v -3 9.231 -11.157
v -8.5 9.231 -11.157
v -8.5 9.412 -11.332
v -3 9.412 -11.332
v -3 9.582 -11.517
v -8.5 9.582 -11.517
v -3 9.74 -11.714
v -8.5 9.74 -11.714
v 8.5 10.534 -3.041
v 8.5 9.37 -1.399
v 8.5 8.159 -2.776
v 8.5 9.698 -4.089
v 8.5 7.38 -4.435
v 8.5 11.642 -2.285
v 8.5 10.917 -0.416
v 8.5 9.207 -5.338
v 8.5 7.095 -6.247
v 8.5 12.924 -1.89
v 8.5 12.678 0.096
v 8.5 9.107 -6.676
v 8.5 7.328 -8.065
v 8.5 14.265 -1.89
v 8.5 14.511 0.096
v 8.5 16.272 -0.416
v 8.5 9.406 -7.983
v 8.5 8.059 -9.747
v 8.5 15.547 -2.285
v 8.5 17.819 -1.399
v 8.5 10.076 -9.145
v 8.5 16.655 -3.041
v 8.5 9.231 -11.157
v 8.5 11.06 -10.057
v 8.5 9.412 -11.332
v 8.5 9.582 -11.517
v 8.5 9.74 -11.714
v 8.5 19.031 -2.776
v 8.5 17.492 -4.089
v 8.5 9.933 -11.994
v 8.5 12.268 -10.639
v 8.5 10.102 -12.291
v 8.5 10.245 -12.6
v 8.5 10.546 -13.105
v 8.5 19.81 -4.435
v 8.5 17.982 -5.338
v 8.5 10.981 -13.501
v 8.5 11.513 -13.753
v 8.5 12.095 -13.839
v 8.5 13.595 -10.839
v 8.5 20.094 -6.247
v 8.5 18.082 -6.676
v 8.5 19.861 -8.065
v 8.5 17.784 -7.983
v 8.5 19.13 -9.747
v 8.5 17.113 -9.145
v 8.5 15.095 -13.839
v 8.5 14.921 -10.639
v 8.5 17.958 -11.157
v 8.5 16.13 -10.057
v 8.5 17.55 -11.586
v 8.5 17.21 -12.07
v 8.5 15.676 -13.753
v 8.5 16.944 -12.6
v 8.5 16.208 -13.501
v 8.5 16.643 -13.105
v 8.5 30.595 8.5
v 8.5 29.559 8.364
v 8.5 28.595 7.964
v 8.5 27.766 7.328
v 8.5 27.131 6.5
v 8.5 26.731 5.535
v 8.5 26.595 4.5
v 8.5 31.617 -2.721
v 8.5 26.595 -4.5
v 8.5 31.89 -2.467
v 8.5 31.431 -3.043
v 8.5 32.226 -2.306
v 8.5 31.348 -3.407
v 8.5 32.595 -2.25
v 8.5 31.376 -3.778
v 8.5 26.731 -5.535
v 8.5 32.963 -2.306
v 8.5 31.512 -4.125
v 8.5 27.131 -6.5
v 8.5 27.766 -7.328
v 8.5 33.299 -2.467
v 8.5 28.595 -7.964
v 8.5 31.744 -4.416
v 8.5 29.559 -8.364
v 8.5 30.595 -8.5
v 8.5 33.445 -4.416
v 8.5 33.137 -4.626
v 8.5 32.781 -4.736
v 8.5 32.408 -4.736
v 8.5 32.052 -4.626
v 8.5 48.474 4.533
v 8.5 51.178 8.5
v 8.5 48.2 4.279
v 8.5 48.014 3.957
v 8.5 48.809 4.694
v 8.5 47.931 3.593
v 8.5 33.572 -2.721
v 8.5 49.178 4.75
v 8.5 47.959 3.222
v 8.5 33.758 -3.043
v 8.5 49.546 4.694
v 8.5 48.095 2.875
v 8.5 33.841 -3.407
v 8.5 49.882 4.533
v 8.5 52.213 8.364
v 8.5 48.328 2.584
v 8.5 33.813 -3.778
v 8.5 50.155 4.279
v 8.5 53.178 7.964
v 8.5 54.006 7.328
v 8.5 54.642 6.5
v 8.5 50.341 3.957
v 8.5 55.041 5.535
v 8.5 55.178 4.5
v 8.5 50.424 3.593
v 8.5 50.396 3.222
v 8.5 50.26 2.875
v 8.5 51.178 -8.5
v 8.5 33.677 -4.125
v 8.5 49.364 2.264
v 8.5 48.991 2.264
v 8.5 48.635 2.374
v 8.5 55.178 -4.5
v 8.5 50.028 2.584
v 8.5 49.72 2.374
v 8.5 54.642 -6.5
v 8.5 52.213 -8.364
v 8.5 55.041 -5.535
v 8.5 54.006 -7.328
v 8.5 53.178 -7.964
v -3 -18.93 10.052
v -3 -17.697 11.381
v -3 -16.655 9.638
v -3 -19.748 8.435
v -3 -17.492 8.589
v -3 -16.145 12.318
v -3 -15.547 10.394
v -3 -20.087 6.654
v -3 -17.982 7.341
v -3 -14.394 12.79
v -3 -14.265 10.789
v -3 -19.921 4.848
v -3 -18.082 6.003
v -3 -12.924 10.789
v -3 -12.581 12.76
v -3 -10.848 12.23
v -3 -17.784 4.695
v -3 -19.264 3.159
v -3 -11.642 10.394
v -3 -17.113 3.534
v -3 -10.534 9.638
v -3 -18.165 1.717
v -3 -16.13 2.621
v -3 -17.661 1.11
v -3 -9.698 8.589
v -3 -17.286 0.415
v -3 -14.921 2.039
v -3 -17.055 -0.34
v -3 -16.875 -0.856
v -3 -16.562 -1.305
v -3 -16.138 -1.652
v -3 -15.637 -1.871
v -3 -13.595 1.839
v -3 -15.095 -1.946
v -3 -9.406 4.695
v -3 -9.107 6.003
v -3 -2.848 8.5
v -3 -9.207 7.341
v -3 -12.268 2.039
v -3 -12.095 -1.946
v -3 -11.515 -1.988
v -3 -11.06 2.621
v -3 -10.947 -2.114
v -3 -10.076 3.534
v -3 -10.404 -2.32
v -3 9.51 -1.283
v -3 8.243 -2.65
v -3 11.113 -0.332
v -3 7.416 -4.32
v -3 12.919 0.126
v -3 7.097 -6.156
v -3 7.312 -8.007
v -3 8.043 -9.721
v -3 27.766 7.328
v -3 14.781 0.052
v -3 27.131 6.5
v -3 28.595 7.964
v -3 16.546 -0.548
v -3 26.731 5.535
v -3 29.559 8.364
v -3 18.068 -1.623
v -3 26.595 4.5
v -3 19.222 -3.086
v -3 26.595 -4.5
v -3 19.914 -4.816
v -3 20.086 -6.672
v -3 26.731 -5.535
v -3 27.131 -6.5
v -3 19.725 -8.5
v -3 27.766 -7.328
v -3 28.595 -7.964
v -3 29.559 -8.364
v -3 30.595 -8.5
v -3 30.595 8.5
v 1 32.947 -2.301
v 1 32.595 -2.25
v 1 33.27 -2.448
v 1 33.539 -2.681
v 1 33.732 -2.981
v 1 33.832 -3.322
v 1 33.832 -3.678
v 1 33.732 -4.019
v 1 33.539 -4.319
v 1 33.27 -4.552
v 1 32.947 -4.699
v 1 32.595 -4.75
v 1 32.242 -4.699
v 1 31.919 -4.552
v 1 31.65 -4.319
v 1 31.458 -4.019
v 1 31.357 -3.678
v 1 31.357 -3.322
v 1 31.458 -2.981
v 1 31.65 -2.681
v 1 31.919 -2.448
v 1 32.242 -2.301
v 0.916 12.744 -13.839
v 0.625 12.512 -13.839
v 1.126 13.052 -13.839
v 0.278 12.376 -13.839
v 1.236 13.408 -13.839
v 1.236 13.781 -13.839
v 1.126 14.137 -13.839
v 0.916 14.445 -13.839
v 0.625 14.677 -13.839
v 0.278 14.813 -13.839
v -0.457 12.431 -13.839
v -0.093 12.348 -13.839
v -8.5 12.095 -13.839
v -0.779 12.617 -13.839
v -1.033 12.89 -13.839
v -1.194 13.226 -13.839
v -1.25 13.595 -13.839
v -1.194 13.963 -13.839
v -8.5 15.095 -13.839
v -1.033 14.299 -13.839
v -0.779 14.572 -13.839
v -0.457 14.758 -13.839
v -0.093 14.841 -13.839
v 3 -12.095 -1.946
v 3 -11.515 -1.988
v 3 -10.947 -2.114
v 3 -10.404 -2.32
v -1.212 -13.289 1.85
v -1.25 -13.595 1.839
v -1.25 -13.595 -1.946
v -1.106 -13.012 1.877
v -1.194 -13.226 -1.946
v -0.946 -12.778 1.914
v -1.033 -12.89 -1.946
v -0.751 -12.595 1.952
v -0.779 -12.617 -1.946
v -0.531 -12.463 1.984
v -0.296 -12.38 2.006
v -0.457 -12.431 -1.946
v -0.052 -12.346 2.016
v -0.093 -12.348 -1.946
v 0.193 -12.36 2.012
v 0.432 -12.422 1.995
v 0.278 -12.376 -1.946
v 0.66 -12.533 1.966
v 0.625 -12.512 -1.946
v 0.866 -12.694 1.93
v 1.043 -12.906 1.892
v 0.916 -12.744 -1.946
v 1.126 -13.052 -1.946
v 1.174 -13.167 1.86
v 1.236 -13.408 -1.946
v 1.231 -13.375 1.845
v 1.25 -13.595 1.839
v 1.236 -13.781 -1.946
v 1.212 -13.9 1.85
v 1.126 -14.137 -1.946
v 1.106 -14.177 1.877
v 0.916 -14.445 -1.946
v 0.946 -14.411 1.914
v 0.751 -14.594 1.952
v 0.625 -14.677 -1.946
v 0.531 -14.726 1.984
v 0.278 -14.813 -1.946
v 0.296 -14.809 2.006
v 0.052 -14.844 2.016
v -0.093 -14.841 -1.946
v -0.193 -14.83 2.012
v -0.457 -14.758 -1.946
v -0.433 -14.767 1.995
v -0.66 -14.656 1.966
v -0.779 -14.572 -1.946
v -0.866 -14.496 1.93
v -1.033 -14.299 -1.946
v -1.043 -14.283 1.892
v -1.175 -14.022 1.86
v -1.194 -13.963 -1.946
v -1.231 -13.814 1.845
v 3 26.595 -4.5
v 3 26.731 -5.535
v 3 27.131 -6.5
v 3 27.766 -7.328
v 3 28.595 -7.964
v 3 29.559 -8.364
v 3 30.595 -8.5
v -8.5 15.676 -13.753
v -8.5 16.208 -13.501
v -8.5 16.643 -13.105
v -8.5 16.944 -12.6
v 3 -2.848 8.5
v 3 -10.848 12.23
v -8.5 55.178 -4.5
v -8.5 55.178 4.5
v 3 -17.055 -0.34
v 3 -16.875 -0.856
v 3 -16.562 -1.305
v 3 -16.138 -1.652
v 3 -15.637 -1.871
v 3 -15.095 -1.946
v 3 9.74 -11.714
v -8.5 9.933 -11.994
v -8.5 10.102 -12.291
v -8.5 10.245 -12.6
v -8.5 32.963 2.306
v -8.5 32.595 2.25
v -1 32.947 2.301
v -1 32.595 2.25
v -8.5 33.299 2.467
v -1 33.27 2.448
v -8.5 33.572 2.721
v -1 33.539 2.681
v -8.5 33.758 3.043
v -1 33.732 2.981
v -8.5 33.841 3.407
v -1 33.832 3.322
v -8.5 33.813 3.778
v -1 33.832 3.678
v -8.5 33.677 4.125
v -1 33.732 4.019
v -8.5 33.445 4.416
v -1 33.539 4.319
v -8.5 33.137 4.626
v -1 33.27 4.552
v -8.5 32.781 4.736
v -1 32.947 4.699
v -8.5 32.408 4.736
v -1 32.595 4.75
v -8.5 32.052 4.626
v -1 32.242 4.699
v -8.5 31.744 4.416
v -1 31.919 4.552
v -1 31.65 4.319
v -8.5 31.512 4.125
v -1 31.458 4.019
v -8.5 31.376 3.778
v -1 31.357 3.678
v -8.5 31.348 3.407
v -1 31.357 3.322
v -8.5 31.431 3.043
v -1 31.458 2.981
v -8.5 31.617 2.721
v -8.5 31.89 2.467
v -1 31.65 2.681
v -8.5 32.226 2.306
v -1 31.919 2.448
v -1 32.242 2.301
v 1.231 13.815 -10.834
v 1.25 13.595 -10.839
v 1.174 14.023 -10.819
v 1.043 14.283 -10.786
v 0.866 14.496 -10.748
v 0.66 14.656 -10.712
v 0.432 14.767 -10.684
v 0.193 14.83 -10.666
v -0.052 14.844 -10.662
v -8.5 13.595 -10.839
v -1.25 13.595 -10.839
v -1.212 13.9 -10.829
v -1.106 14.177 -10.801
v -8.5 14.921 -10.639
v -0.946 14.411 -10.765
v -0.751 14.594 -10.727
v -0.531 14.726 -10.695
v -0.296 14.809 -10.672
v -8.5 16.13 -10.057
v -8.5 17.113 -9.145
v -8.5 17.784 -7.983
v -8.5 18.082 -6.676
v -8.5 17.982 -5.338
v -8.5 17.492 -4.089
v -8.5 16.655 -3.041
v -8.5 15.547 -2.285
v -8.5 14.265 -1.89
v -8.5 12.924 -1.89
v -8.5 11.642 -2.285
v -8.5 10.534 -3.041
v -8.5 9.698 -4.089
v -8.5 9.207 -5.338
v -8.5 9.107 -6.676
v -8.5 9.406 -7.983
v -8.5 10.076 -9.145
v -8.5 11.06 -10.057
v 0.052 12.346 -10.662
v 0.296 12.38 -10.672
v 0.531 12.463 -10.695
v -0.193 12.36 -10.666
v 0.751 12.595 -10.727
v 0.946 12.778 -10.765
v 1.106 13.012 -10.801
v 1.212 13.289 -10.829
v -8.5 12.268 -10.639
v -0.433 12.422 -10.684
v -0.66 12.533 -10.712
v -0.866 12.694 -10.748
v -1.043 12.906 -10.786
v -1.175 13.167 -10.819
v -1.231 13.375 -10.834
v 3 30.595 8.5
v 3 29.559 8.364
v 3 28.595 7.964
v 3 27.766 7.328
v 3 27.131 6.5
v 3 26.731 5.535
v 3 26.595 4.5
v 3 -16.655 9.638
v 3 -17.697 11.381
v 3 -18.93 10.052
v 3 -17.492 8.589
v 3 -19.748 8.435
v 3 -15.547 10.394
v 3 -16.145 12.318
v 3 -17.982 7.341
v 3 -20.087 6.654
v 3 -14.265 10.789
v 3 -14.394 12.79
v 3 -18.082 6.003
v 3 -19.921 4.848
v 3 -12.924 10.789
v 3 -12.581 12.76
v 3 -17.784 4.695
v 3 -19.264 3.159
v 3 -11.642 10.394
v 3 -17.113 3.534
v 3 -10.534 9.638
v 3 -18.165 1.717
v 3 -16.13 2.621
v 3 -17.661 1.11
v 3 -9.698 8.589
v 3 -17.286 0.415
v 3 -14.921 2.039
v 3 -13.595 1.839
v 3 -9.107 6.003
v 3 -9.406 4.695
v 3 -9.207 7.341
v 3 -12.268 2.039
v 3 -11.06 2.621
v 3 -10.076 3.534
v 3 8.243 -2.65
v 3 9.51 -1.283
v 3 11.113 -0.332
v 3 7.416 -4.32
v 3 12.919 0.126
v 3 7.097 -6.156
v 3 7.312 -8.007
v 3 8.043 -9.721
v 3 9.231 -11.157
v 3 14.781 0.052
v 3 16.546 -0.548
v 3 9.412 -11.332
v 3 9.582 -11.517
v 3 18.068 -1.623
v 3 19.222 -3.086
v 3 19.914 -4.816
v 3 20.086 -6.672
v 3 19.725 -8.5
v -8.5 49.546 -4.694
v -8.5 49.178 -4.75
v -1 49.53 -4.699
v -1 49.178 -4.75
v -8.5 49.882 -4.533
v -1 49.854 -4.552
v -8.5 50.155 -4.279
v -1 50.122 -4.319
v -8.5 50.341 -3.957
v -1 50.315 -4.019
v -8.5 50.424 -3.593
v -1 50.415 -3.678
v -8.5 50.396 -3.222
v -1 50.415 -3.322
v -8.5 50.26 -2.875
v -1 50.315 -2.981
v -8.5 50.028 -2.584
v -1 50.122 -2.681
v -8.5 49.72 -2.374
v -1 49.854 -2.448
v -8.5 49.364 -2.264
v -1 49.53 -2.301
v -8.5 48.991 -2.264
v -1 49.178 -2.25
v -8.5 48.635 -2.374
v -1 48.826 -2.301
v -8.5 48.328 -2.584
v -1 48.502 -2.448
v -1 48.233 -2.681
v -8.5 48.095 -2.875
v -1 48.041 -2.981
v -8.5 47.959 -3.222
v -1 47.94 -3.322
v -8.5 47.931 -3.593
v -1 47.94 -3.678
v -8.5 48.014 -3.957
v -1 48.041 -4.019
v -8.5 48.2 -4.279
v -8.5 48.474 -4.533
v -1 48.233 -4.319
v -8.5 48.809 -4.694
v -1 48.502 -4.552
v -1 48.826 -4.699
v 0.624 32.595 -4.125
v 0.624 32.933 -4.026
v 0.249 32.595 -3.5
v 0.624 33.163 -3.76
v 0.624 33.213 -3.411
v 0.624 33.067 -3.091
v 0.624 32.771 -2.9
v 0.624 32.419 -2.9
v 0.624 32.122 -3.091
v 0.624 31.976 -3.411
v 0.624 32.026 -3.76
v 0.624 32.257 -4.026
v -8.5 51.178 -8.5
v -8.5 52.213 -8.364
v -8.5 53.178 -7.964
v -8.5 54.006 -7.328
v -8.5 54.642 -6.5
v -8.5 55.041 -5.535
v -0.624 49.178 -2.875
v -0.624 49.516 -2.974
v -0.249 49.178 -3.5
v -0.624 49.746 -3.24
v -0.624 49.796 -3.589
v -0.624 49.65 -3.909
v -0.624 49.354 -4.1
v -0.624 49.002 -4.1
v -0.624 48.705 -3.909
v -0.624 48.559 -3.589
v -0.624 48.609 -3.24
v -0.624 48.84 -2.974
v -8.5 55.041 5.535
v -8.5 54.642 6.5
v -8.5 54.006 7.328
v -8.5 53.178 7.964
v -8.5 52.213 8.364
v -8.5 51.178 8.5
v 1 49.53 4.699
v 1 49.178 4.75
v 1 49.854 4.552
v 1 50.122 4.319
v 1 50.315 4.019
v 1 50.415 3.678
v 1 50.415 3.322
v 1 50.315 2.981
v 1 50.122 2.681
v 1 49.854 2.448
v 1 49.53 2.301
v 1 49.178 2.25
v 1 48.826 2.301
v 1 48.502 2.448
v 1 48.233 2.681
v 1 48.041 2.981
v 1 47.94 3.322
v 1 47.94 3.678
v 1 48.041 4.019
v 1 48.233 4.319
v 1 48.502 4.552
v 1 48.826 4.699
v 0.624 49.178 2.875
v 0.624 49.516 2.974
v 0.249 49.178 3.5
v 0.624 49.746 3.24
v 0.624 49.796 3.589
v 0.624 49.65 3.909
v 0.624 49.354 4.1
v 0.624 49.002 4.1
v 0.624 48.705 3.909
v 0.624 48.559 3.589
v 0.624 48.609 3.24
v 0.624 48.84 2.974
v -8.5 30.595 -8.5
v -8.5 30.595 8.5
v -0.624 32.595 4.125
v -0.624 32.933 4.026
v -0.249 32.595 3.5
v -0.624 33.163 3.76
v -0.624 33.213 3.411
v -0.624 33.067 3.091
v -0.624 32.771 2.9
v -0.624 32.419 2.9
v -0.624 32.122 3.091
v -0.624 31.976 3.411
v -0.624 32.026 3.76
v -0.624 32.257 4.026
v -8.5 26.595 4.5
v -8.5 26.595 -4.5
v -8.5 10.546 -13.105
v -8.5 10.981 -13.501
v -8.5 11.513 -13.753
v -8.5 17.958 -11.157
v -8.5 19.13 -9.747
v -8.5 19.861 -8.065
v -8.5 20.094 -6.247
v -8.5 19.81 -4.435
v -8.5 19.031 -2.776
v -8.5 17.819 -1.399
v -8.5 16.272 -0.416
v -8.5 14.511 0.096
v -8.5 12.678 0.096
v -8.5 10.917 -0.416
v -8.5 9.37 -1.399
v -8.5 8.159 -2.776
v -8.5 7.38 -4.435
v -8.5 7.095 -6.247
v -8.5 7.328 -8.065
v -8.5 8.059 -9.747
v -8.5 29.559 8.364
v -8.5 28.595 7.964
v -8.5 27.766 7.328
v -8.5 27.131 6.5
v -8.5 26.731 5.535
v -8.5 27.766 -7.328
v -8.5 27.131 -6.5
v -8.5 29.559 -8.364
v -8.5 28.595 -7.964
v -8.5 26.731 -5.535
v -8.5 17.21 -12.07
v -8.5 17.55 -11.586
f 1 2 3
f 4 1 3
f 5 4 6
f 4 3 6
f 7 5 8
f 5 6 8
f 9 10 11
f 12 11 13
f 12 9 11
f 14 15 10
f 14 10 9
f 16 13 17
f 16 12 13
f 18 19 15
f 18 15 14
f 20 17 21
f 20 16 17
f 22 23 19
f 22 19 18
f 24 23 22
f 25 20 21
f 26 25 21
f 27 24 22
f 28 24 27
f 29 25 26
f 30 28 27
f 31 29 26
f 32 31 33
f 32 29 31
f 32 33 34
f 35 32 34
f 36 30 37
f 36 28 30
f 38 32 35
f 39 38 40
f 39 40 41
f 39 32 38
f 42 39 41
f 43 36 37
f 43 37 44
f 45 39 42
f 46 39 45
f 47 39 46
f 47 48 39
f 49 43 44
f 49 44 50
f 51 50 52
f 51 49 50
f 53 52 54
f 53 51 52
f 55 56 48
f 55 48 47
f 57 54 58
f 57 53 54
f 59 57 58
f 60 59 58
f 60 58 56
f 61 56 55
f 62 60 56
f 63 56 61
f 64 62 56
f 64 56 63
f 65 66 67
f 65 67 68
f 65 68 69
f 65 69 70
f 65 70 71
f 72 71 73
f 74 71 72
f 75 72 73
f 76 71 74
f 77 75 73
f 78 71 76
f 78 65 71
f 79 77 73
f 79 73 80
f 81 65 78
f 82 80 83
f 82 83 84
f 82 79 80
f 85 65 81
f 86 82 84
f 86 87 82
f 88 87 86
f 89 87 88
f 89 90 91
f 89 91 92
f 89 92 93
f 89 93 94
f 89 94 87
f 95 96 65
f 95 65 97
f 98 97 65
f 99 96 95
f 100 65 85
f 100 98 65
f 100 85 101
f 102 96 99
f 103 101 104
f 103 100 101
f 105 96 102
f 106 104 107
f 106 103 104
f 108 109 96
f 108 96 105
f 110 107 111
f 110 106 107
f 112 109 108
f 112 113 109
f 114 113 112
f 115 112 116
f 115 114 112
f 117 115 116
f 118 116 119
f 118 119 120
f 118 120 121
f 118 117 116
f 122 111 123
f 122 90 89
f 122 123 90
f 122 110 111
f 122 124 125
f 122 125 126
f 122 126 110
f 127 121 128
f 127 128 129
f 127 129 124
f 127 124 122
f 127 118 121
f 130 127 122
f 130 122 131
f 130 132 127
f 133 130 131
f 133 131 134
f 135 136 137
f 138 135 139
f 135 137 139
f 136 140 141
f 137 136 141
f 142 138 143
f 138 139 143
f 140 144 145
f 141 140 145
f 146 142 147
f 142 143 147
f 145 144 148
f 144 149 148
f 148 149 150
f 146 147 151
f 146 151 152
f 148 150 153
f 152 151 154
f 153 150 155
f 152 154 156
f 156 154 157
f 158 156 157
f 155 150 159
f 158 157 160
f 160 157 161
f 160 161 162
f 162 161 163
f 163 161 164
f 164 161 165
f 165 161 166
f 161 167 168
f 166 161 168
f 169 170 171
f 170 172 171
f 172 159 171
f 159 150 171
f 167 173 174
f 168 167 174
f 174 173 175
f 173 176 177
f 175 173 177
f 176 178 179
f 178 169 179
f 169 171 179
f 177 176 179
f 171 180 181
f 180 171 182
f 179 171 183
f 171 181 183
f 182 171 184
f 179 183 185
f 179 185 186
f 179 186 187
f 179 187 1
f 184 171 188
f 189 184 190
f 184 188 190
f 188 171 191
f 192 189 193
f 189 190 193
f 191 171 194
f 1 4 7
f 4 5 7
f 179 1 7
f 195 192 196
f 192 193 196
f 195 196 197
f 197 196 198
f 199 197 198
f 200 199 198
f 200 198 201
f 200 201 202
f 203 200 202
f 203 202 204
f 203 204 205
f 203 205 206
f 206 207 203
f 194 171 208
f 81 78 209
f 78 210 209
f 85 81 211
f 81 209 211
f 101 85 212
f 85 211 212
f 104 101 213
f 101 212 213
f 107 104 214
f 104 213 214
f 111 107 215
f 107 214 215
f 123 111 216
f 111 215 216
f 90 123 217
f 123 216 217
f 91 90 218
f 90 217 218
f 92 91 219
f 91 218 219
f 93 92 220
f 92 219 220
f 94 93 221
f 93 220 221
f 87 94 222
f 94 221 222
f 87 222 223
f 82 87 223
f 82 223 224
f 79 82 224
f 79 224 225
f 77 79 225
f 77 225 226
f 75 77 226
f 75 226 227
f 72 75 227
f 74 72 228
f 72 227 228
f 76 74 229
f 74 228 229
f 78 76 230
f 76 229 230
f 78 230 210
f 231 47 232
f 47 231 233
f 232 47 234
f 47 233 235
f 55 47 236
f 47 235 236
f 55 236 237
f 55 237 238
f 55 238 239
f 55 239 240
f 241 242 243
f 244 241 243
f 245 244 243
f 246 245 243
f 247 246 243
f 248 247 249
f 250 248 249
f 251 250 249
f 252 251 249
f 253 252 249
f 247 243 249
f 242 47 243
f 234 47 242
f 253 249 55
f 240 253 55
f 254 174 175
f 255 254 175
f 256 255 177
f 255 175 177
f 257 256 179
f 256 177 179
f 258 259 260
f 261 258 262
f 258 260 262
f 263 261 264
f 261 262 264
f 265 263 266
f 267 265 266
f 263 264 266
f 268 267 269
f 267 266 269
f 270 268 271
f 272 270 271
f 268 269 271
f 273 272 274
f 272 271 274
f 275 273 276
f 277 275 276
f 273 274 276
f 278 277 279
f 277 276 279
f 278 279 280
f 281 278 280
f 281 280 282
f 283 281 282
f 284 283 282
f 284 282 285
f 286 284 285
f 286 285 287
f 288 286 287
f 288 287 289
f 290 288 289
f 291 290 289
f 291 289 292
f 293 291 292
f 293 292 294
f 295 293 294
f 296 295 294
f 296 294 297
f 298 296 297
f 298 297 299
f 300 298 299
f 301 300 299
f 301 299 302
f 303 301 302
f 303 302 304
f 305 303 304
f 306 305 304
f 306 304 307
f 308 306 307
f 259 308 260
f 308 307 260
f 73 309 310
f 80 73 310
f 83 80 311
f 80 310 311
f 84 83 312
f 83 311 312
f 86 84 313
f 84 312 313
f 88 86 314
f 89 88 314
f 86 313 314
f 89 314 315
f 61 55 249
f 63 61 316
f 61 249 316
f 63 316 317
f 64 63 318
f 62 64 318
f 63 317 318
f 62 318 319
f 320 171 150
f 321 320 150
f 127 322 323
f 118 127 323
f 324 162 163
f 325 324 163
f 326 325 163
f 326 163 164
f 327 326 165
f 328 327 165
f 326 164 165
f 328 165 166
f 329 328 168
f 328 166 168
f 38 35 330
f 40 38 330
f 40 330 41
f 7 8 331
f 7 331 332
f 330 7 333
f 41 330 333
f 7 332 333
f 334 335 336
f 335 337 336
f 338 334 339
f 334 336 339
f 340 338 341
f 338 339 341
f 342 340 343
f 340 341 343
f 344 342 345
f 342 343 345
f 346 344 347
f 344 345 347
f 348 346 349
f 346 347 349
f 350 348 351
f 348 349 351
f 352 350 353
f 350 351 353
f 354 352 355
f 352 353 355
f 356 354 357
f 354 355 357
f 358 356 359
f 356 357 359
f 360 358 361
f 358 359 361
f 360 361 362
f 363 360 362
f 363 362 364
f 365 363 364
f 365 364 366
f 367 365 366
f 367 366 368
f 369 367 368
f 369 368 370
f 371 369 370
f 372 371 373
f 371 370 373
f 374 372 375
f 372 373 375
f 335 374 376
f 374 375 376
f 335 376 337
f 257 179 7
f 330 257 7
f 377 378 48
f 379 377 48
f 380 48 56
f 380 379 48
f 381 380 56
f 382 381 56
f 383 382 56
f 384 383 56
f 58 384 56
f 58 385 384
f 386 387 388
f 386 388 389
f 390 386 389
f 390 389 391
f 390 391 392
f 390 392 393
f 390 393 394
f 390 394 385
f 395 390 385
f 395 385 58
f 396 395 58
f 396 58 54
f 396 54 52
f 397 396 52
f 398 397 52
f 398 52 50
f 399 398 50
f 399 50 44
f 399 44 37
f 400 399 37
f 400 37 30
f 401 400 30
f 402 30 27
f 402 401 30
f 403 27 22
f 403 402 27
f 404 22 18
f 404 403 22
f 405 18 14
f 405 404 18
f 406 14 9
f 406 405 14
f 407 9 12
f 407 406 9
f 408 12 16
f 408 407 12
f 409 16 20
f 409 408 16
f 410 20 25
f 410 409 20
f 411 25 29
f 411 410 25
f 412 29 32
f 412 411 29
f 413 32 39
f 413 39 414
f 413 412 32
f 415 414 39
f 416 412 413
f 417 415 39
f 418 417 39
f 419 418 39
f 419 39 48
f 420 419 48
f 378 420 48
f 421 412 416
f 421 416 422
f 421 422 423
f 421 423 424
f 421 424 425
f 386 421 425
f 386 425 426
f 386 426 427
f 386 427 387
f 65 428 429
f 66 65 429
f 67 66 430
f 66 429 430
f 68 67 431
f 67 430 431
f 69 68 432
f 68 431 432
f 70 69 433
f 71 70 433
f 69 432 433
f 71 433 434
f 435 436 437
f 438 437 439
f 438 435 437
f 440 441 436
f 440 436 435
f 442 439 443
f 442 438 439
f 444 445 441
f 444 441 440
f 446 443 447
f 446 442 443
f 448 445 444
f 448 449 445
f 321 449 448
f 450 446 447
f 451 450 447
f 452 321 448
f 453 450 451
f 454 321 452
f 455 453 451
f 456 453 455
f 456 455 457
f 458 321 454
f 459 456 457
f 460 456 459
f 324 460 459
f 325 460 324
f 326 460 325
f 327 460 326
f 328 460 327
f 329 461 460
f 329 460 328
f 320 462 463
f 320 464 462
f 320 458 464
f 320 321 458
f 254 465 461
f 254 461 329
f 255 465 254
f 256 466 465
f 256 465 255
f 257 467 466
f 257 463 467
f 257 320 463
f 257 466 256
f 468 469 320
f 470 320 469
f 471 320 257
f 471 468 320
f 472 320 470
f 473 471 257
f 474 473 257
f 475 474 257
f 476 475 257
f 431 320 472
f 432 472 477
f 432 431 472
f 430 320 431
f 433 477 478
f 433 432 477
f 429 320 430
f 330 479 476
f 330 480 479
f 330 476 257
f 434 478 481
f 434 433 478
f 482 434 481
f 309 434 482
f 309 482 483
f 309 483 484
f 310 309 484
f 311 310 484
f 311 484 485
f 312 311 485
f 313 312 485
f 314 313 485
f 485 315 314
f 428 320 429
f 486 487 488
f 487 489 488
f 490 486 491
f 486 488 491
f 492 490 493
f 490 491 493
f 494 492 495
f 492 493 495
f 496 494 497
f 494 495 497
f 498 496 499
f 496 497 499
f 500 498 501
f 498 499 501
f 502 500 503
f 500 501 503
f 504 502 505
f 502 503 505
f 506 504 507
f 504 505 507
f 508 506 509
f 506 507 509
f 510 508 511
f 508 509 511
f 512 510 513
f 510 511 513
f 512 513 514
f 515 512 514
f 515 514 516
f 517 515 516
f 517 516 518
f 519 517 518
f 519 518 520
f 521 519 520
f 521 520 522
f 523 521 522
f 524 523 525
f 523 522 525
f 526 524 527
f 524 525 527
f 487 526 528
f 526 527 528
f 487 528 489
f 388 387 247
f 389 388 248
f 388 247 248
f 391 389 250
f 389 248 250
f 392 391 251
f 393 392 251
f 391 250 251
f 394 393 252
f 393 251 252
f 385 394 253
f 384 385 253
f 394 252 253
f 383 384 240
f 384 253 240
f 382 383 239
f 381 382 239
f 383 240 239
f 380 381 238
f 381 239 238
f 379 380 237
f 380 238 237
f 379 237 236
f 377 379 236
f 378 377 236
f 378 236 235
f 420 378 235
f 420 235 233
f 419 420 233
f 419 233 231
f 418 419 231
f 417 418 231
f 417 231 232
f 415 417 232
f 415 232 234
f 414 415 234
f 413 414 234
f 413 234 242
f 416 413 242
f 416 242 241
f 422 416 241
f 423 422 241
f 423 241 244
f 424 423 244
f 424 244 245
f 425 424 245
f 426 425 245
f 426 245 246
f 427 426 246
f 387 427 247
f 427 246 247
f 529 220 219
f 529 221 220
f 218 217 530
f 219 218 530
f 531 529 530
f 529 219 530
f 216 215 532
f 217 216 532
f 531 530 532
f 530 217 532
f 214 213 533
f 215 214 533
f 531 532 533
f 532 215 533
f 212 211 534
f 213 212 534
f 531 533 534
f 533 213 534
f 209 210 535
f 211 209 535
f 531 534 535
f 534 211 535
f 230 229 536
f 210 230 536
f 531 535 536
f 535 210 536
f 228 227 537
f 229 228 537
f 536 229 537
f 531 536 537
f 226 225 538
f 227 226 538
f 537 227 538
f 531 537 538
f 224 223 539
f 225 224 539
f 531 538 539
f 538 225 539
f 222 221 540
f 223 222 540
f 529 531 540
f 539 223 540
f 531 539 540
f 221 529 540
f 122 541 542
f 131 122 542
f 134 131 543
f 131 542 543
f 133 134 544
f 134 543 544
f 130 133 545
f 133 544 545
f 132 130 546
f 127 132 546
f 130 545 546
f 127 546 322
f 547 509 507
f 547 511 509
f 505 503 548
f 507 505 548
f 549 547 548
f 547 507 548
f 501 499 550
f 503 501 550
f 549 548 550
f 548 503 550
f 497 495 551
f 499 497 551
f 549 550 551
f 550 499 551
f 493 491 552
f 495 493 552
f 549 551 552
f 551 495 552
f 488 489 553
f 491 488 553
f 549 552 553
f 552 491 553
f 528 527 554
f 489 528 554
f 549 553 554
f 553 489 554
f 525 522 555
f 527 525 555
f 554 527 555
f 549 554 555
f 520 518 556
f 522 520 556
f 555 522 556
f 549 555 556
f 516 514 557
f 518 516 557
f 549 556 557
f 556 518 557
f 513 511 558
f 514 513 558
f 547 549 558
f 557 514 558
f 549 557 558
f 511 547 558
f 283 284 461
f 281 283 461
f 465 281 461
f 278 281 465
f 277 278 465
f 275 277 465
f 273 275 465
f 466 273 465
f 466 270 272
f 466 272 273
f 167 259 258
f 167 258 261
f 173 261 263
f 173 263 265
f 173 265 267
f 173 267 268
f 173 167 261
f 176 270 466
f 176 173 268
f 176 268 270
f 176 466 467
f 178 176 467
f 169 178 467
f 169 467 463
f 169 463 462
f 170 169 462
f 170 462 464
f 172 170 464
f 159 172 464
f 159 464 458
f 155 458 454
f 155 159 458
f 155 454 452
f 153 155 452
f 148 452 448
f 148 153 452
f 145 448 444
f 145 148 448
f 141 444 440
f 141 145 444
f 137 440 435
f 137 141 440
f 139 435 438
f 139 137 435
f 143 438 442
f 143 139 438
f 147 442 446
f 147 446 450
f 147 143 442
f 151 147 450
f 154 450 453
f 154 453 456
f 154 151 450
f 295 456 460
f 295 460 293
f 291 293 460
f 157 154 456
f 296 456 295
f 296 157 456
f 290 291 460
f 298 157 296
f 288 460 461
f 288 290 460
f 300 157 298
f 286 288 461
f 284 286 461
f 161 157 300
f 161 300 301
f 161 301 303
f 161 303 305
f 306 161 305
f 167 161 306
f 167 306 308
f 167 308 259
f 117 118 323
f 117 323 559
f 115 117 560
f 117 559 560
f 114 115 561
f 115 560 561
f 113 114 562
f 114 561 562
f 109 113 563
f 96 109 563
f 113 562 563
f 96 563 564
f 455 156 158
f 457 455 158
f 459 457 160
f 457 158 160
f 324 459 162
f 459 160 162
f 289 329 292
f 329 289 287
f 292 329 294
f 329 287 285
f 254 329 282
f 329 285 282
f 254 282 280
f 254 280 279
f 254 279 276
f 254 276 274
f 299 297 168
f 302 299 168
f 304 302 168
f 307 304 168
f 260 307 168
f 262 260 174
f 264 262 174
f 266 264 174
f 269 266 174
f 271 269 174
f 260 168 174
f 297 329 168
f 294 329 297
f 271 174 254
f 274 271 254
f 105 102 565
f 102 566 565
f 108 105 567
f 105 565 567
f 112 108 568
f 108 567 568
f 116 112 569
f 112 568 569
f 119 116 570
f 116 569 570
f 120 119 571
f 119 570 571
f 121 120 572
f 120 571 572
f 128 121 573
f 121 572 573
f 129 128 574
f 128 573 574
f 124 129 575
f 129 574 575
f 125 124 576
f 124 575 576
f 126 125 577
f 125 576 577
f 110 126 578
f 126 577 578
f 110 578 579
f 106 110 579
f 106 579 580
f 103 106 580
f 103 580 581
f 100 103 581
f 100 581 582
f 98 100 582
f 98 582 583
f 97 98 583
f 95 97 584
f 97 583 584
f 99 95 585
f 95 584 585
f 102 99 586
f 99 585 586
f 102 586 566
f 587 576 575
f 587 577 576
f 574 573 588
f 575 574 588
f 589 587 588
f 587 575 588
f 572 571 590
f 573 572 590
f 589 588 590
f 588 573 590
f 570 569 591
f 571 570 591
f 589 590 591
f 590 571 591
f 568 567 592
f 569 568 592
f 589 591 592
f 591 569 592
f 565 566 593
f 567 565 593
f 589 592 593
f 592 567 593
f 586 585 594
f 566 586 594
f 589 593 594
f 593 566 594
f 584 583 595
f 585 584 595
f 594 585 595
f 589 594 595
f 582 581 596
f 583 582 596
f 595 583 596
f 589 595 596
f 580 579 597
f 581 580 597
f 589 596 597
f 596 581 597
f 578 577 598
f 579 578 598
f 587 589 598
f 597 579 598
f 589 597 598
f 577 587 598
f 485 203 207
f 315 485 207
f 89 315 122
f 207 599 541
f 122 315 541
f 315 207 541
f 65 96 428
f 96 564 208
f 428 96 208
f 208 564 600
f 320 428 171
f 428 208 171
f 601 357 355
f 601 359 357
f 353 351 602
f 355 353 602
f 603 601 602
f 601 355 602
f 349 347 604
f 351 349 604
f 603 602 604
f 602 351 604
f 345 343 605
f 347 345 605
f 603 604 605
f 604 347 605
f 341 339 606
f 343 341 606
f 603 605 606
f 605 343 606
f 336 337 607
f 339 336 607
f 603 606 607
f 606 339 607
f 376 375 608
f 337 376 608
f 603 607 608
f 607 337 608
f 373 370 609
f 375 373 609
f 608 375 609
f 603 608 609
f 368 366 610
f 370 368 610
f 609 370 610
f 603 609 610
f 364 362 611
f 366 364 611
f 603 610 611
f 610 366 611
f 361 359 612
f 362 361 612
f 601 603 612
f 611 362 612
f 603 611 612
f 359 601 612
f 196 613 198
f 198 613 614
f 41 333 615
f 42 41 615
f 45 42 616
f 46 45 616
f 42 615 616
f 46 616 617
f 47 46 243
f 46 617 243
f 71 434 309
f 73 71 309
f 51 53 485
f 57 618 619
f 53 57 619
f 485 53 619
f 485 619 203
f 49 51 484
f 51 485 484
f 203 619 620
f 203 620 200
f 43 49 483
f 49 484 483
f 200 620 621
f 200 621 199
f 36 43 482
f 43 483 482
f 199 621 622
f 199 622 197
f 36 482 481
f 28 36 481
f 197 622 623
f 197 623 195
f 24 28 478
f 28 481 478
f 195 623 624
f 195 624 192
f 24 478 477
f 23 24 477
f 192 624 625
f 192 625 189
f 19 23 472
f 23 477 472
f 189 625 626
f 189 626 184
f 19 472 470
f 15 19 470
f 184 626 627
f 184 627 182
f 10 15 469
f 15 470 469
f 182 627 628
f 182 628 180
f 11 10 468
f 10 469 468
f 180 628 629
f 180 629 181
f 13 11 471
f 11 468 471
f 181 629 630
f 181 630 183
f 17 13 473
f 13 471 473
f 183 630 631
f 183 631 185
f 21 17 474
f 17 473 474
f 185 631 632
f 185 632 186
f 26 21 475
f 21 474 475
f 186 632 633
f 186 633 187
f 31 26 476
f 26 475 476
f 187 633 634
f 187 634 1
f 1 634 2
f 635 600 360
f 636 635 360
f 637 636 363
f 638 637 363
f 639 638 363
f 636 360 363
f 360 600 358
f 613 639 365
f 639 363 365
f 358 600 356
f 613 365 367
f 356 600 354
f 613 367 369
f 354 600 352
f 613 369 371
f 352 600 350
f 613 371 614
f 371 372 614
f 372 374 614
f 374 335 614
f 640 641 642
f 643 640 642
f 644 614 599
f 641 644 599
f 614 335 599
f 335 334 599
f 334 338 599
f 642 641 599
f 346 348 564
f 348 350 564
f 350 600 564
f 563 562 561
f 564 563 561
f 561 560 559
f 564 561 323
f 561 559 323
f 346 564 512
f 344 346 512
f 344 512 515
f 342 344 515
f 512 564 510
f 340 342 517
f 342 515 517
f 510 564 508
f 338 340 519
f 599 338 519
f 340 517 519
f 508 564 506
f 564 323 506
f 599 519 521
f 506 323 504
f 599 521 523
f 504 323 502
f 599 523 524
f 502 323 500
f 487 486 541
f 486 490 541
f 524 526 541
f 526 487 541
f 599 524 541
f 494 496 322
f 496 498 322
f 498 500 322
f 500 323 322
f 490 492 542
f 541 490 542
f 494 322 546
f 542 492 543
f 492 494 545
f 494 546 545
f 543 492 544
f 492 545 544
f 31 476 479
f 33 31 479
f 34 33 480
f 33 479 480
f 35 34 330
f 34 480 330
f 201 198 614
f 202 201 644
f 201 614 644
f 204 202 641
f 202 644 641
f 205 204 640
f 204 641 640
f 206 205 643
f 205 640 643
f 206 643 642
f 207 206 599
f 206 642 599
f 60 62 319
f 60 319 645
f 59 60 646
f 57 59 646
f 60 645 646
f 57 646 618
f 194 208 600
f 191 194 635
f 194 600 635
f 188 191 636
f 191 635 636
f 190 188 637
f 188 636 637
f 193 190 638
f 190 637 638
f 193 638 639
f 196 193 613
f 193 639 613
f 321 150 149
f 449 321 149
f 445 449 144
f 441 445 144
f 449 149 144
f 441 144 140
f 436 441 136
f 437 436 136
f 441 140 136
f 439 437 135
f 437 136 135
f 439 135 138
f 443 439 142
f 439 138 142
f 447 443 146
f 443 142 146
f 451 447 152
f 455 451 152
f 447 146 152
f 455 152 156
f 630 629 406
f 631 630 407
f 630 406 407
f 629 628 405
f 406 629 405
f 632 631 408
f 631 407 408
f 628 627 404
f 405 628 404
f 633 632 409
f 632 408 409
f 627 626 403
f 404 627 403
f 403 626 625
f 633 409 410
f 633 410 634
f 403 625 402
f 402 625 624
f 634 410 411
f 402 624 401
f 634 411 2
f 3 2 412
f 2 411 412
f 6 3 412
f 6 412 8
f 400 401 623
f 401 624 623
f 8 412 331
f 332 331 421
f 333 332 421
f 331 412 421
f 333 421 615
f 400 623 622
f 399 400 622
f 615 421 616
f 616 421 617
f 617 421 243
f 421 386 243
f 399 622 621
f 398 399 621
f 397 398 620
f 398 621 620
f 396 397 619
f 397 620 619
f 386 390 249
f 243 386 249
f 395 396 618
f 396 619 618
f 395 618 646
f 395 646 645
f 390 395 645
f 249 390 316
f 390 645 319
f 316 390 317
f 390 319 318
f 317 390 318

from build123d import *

# Parameters (mm, degrees)
BOSS_EXTRUDE1_DEPTH       = 3
BOSS_EXTRUDE1_DEPTH_BACK  = 3
SKETCH2_R                 = 4.5
BOSS_EXTRUDE4_START       = -8.5
SKETCH2_6_R               = 6.5
SKETCH2_6_R_2             = 4.5
BOSS_EXTRUDE4_DEPTH       = 17
BOSS_EXTRUDE2_DEPTH       = 8.5
BOSS_EXTRUDE2_DEPTH_BACK  = 8.5
M2_TAPPED_HOLE1_REACH     = 63.876
M2_TAPPED_HOLE1_BORE_R    = 1.25
M2_TAPPED_HOLE2_REACH     = 59.753
M2_TAPPED_HOLE2_BORE_R    = 1.25
M3X0_5_TAPPED_HOLE1_D     = 2.5
M3X0_5_TAPPED_HOLE1_DEPTH = 7.5
M3X0_5_TAPPED_HOLE1_TIP   = 0.751075774
M3X0_5_TAPPED_HOLE2_D     = 2.5
M3X0_5_TAPPED_HOLE2_DEPTH = 7.5
M3X0_5_TAPPED_HOLE2_TIP   = 0.751075774


with BuildPart() as part:
    # Sketch2 → Boss-Extrude1 (new, two sides: drawn at the far end of the back side and taken through both)
    with BuildSketch(Plane(origin=(0, 0, 0), x_dir=(0, 0, -1), z_dir=(1, 0, 0)).offset(-BOSS_EXTRUDE1_DEPTH_BACK)):
        with BuildLine():
            ThreePointArc((0.33951151, -17.055452752), (1.492864746, -16.361954251), (1.94565571, -15.094616806))
            Line((1.94565571, -15.094616806), (1.94565571, -12.094616806))
            ThreePointArc((1.94565571, -12.094616806), (2.040471682, -11.22885835), (2.320424562, -10.404143759))
            Line((2.320424562, -10.404143759), (11.713700119, 9.73980068))
            ThreePointArc((11.713700119, 9.73980068), (12.140663851, 10.020732686), (12.599964806, 10.244927809))
            ThreePointArc((12.599964806, 10.244927809), (13.500806616, 10.98137419), (13.839273926, 12.094616806))
            Line((13.839273926, 12.094616806), (13.839273926, 15.094616806))
            ThreePointArc((13.839273926, 15.094616806), (13.500806616, 16.207859421), (12.599964806, 16.944305803))
            ThreePointArc((12.599964806, 16.944305803), (11.821767305, 17.370774506), (11.156747464, 17.958324943))
            ThreePointArc((11.156747464, 17.958324943), (9.9384514, 19.007187499), (8.5, 19.724972654))
            Line((8.5, 19.724972654), (8.5, 51.177740757))
            ThreePointArc((8.5, 51.177740757), (7.328427125, 54.006167882), (4.5, 55.177740757))
            Line((4.5, 55.177740757), (-4.5, 55.177740757))
            ThreePointArc((-4.5, 55.177740757), (-7.328427125, 54.006167882), (-8.5, 51.177740757))
            Line((-8.5, 51.177740757), (-8.5, -2.847998534))
            Line((-8.5, -2.847998534), (-12.230274542, -10.847598104))
            ThreePointArc((-12.230274542, -10.847598104), (-10.052447802, -18.929627561), (-1.717156713, -18.164740706))
            ThreePointArc((-1.717156713, -18.164740706), (-0.771632326, -17.45656389), (0.33951151, -17.055452752))
        make_face()
        with Locations((-6.339273926, -13.594616806)):
            Circle(SKETCH2_R, mode=Mode.SUBTRACT)
        with Locations((6.339273926, 13.594616806)):
            Circle(SKETCH2_R, mode=Mode.SUBTRACT)
    extrude(amount=BOSS_EXTRUDE1_DEPTH + BOSS_EXTRUDE1_DEPTH_BACK)

    # Sketch2<6> → Boss-Extrude4 (add)
    # profile 1 of 2: a face of its own
    with BuildSketch(Plane(origin=(0, 0, 0), x_dir=(0, 0, -1), z_dir=(1, 0, 0)).offset(BOSS_EXTRUDE4_START)):
        with BuildLine():
            ThreePointArc((11.156747464, 9.230908668), (11.423199363, 9.498514711), (11.713700119, 9.73980068))
            ThreePointArc((11.713700119, 9.73980068), (12.140663851, 10.020732686), (12.599964806, 10.244927809))
            ThreePointArc((12.599964806, 10.244927809), (13.500806616, 10.98137419), (13.839273926, 12.094616806))
            Line((13.839273926, 12.094616806), (13.839273926, 15.094616806))
            ThreePointArc((13.839273926, 15.094616806), (13.500806616, 16.207859421), (12.599964806, 16.944305803))
            ThreePointArc((12.599964806, 16.944305803), (11.821767305, 17.370774506), (11.156747464, 17.958324943))
            ThreePointArc((11.156747464, 17.958324943), (12.404073098, 15.933037427), (12.839273926, 13.594616806))
            ThreePointArc((12.839273926, 13.594616806), (12.404073098, 11.256196185), (11.156747464, 9.230908668))
        make_face()
    # profile 2 of 2: a face of its own
    with BuildSketch(Plane(origin=(0, 0, 0), x_dir=(0, 0, -1), z_dir=(1, 0, 0)).offset(BOSS_EXTRUDE4_START)):
        with Locations((6.339273926, 13.594616806)):
            Circle(SKETCH2_6_R)
        with Locations((6.339273926, 13.594616806)):
            Circle(SKETCH2_6_R_2, mode=Mode.SUBTRACT)
    extrude(amount=BOSS_EXTRUDE4_DEPTH)

    # Sketch2<4> → Boss-Extrude2 (add, two sides: drawn at the far end of the back side and taken through both)
    with BuildSketch(Plane(origin=(0, 0, 0), x_dir=(0, 0, -1), z_dir=(1, 0, 0)).offset(-BOSS_EXTRUDE2_DEPTH_BACK)):
        with BuildLine():
            Line((-8.5, 51.177740757), (-8.5, 30.594616806))
            ThreePointArc((-8.5, 30.594616806), (-7.328427125, 27.766189681), (-4.5, 26.594616806))
            Line((-4.5, 26.594616806), (4.5, 26.594616806))
            ThreePointArc((4.5, 26.594616806), (7.328427125, 27.766189681), (8.5, 30.594616806))
            Line((8.5, 30.594616806), (8.5, 51.177740757))
            ThreePointArc((8.5, 51.177740757), (7.328427125, 54.006167882), (4.5, 55.177740757))
            Line((4.5, 55.177740757), (-4.5, 55.177740757))
            ThreePointArc((-4.5, 55.177740757), (-7.328427125, 54.006167882), (-8.5, 51.177740757))
        make_face()
    extrude(amount=BOSS_EXTRUDE2_DEPTH + BOSS_EXTRUDE2_DEPTH_BACK)

    # M2 Tapped Hole1 bore → M2 Tapped Hole1 (cut, up to next)
    with BuildSketch(Plane(origin=(0, 0, -13.839273926), x_dir=(-1, 0, 0), z_dir=(0, 0, -1)), mode=Mode.PRIVATE) as m2_tapped_hole1_sk1:
        with Locations((0, 13.594616806)):
            Circle(M2_TAPPED_HOLE1_BORE_R)
    m2_tapped_hole1_tool1 = extrude(m2_tapped_hole1_sk1.sketch, amount=-M2_TAPPED_HOLE1_REACH, mode=Mode.PRIVATE) & part.part
    add(m2_tapped_hole1_tool1.solids().sort_by_distance((0, 13.594617, -13.839274))[0], mode=Mode.SUBTRACT)

    # M2 Tapped Hole2 bore → M2 Tapped Hole2 (cut, up to next)
    with BuildSketch(Plane(origin=(0, 0, -1.94565571), x_dir=(-1, 0, 0), z_dir=(0, 0, -1)), mode=Mode.PRIVATE) as m2_tapped_hole2_sk1:
        with Locations((0, -13.594616806)):
            Circle(M2_TAPPED_HOLE2_BORE_R)
    m2_tapped_hole2_tool1 = extrude(m2_tapped_hole2_sk1.sketch, amount=-M2_TAPPED_HOLE2_REACH, mode=Mode.PRIVATE) & part.part
    add(m2_tapped_hole2_tool1.solids().sort_by_distance((0, -13.594617, -1.945656))[0], mode=Mode.SUBTRACT)

    # M3x0.5 Tapped Hole1
    with Locations(Plane.ZY.offset(8.5)):
        with Locations((-3.5, 49.177740757), (3.5, 32.594616806)):
            Hole(M3X0_5_TAPPED_HOLE1_D / 2, depth=M3X0_5_TAPPED_HOLE1_DEPTH)
            with Locations((0, 0, -(M3X0_5_TAPPED_HOLE1_DEPTH + M3X0_5_TAPPED_HOLE1_TIP / 2))):  # 118° drill point
                Cone(0, M3X0_5_TAPPED_HOLE1_D / 2, M3X0_5_TAPPED_HOLE1_TIP, mode=Mode.SUBTRACT)

    # M3x0.5 Tapped Hole2
    with Locations(Plane(origin=(8.5, 0, 0), x_dir=(0, 0, -1), z_dir=(1, 0, 0))):
        with Locations((-3.5, 49.177740757), (3.5, 32.594616806)):
            Hole(M3X0_5_TAPPED_HOLE2_D / 2, depth=M3X0_5_TAPPED_HOLE2_DEPTH)
            with Locations((0, 0, -(M3X0_5_TAPPED_HOLE2_DEPTH + M3X0_5_TAPPED_HOLE2_TIP / 2))):  # 118° drill point
                Cone(0, M3X0_5_TAPPED_HOLE2_D / 2, M3X0_5_TAPPED_HOLE2_TIP, mode=Mode.SUBTRACT)


solid = part.part
